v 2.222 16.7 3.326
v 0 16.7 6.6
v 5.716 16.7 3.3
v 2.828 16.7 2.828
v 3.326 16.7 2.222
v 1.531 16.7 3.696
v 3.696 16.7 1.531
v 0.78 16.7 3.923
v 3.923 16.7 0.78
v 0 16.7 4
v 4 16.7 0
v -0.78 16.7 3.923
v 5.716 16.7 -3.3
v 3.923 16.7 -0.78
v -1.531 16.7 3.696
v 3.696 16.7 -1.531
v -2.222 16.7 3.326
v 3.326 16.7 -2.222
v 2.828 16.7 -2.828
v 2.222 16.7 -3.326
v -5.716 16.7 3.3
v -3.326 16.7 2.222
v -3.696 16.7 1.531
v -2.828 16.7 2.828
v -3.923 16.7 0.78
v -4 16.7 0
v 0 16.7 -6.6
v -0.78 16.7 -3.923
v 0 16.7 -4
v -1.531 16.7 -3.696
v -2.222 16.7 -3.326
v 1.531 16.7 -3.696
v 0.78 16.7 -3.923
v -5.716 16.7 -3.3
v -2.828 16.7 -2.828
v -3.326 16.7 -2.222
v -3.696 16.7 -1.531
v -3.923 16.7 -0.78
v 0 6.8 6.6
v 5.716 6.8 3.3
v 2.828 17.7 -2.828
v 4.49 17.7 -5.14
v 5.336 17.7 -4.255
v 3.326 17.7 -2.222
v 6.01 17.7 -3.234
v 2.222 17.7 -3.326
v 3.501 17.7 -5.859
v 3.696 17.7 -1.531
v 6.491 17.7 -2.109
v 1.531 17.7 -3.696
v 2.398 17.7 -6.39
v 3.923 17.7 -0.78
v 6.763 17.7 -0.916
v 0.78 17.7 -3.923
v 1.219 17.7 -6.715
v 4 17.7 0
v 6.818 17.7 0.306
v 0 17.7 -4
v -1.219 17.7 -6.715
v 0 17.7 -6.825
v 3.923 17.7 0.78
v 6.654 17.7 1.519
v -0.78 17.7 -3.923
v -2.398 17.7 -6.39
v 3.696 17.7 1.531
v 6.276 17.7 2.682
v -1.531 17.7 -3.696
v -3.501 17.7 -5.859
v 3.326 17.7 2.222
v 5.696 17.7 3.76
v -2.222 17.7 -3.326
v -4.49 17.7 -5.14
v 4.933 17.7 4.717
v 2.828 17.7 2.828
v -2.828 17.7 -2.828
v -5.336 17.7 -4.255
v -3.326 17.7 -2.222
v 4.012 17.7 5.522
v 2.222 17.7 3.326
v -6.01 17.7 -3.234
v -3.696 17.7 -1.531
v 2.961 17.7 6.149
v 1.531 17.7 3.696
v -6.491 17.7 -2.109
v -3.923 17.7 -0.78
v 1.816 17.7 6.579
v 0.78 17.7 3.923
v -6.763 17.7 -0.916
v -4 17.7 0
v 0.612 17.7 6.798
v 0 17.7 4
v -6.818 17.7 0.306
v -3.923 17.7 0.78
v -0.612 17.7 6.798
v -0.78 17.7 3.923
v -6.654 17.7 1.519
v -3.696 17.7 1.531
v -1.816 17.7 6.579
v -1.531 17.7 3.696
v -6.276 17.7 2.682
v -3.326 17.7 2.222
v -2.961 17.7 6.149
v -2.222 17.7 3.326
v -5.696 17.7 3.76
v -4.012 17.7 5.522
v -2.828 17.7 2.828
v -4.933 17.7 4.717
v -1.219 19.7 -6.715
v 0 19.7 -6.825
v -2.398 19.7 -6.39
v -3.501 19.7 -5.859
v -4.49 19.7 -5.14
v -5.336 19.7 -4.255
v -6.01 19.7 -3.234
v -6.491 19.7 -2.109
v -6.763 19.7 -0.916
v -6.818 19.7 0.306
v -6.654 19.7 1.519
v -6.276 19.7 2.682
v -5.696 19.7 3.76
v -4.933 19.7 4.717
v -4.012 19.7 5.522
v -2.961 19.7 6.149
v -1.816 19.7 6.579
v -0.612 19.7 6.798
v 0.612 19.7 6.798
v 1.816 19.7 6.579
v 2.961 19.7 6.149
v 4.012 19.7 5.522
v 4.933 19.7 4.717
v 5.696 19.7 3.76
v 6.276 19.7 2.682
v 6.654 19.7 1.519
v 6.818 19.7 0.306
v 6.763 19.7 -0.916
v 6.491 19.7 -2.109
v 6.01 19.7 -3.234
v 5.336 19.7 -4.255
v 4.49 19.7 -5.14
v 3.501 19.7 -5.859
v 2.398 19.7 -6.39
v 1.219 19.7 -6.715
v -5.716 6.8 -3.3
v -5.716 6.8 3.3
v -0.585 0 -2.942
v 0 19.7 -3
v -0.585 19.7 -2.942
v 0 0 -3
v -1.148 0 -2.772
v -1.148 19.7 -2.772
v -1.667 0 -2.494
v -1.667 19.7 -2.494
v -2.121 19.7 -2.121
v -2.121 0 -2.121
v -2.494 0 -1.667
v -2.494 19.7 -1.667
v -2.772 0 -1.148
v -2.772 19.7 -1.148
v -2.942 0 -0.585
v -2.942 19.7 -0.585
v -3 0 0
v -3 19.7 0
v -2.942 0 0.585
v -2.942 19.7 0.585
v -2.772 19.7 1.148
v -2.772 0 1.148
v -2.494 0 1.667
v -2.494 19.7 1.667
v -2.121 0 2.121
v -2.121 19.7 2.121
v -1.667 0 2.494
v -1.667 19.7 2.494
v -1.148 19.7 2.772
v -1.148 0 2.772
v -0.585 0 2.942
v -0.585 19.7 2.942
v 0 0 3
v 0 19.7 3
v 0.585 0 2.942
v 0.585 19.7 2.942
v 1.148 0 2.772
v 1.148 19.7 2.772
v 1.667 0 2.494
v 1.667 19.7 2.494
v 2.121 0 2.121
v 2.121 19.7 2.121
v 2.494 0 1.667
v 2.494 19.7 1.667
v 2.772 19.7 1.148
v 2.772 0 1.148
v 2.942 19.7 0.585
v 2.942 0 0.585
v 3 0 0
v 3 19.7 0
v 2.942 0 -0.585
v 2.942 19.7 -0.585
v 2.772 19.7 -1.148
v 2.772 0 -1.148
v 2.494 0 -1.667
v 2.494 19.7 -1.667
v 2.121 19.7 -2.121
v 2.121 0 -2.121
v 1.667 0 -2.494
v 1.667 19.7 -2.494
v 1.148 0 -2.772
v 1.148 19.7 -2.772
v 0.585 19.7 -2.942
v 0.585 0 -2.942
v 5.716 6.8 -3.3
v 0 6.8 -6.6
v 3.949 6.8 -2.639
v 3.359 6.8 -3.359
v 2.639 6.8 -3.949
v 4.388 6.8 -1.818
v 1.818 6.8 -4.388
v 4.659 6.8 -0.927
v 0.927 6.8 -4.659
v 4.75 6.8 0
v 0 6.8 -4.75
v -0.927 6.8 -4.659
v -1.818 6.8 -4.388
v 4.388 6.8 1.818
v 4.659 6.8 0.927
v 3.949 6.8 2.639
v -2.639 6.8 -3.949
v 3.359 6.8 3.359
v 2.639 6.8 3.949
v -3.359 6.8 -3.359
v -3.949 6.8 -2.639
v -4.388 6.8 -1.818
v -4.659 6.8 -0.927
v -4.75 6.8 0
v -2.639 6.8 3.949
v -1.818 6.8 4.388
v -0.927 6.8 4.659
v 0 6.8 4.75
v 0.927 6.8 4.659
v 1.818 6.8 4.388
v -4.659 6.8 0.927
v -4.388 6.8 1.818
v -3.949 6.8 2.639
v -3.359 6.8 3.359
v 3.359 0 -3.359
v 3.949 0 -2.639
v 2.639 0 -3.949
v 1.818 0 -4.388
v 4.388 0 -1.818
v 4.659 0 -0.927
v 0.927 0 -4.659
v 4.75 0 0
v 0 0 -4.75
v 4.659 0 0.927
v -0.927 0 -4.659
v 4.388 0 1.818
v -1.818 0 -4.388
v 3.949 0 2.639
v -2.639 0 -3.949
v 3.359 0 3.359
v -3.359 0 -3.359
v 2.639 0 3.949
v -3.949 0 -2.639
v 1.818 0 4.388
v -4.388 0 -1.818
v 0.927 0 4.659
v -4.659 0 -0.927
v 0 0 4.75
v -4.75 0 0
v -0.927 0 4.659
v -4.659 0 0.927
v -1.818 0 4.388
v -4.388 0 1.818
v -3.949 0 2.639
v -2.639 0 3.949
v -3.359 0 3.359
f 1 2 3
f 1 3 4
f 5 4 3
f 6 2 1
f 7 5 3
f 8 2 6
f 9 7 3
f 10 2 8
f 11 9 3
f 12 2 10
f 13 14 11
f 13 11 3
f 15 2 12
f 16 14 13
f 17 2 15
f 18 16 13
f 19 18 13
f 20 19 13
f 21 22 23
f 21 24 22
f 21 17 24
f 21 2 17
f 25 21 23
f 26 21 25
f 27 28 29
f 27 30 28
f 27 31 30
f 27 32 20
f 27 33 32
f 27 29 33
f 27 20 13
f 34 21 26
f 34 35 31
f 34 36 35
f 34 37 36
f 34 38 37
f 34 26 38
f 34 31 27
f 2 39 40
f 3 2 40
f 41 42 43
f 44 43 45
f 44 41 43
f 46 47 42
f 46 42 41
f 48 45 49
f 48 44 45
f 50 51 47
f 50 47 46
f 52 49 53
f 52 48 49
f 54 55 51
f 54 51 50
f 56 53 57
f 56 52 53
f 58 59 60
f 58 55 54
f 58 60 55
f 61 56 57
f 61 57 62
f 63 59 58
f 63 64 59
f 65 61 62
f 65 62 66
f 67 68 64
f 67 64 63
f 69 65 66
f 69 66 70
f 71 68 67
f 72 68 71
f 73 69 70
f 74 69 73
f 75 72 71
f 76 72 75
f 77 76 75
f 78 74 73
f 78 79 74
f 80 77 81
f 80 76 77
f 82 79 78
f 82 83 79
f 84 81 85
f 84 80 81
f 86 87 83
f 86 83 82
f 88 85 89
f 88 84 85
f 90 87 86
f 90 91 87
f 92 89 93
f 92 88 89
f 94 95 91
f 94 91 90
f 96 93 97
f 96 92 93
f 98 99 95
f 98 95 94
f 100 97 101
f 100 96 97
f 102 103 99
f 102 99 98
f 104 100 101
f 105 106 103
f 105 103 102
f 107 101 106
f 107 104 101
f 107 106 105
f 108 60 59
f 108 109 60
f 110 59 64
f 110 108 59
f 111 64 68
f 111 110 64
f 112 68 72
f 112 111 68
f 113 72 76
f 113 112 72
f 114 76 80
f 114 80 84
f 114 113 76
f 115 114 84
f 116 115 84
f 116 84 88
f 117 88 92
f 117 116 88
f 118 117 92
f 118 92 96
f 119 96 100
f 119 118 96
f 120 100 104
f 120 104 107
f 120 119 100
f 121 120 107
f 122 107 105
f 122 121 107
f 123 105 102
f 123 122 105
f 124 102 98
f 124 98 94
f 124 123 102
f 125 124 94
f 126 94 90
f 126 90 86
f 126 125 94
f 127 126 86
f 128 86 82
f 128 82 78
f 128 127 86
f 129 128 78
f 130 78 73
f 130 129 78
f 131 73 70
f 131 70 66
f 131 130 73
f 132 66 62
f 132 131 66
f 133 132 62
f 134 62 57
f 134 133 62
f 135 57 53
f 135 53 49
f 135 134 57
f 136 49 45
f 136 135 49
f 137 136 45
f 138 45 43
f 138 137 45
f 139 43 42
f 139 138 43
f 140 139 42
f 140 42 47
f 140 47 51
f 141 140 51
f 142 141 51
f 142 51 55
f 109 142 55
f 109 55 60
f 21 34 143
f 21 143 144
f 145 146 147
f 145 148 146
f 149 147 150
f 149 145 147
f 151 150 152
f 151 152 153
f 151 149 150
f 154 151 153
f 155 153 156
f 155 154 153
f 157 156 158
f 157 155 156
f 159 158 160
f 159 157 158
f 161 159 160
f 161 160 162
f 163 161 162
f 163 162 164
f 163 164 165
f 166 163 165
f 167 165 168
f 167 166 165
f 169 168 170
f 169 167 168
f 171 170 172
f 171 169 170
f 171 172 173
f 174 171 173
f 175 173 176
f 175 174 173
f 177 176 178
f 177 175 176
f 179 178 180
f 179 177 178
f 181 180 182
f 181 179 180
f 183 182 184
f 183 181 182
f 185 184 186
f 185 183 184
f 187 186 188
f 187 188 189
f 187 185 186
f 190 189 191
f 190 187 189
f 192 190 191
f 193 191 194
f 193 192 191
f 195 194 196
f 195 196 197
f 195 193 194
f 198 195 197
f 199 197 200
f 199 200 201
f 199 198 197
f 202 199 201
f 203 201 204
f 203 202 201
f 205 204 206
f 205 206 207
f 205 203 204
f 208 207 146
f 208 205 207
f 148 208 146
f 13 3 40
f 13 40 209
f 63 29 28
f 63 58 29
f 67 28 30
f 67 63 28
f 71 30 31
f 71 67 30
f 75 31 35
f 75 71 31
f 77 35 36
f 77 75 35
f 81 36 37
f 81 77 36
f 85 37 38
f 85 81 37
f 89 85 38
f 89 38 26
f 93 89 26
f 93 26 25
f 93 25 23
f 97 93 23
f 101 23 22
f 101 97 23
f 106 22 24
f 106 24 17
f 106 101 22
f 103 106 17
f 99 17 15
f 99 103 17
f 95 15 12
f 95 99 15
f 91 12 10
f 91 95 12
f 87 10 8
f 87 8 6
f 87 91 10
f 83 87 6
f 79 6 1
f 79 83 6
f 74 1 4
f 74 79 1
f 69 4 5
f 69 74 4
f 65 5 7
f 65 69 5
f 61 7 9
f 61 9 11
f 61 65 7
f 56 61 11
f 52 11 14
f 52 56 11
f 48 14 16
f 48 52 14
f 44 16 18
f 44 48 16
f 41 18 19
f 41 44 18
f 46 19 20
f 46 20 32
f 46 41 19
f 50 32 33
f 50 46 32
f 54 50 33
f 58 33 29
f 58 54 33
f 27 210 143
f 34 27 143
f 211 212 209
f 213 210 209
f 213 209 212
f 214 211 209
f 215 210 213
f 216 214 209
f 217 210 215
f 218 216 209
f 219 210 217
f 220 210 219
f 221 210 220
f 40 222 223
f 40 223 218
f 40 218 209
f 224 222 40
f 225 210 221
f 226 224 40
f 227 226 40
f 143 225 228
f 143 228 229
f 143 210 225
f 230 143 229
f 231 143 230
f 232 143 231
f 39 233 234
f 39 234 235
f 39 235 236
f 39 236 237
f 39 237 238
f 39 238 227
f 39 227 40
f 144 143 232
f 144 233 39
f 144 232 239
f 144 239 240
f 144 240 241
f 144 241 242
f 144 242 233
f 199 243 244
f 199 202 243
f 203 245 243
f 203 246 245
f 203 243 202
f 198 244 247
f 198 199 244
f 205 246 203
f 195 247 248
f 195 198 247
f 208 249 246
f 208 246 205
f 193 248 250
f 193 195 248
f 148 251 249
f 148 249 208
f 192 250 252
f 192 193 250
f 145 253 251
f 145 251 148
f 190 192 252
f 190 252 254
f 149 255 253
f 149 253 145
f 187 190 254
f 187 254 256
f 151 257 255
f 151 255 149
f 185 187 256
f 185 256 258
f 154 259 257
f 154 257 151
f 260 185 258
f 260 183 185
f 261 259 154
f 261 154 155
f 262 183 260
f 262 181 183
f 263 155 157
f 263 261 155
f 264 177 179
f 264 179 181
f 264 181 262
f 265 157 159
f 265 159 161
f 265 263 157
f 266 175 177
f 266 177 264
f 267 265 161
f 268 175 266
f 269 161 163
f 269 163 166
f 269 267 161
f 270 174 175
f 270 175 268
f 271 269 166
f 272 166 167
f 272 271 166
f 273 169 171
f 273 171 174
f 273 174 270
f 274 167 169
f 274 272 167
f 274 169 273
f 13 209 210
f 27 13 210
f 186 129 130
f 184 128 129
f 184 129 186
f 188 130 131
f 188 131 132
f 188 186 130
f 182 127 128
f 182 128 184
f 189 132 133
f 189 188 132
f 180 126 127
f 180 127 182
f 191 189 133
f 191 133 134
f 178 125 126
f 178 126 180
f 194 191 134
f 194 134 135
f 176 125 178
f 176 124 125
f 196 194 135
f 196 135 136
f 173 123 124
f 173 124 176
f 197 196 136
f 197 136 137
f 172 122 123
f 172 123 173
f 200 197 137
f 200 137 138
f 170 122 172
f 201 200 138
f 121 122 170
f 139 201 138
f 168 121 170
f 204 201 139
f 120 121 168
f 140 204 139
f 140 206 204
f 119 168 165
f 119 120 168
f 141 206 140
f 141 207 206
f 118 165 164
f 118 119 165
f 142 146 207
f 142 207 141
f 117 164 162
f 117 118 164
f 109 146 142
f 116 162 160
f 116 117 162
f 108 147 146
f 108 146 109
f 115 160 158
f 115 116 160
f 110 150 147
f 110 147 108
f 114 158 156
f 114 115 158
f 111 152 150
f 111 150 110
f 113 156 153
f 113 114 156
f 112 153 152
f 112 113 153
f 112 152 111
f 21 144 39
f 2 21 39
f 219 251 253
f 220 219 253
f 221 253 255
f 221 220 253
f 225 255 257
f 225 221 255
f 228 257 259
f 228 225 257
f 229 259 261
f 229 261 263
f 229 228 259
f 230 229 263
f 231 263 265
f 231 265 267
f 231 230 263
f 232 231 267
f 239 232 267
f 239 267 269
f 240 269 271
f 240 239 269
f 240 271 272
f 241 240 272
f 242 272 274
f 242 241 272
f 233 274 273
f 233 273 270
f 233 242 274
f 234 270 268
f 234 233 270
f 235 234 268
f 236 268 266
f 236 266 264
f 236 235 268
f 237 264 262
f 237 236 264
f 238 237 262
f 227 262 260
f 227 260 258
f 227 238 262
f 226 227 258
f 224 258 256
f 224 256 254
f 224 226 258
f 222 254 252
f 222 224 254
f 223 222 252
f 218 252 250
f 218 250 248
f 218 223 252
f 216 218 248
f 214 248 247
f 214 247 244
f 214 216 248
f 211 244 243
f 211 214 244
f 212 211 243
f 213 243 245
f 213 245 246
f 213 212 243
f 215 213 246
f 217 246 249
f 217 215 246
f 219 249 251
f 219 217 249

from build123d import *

# Parameters (mm, degrees)
CUT_EXTRUDE1_REACH = 18.111


with BuildPart() as part:
    # Sketch1 → Revolve1 (revolve)
    with BuildSketch(Plane.XY, mode=Mode.PRIVATE) as revolve1_sk:
        Polygon((-4.75, 0), (-4.75, 6.8), (-6.6, 6.8), (-6.6, 16.7), (-4, 16.7), (-4, 17.7), (-6.825, 17.7), (-6.825, 19.7), (-3, 19.7), (-3, 0), align=None)
    revolve(revolve1_sk.sketch.rotate(Axis((0, 0, 0), (0, 1, 0)), 270), axis=Axis((0, 0, 0), (0, 1, 0)))

    # Sketch2 → Cut-Extrude1 (cut, up to next)
    with BuildSketch(Plane.XZ.offset(-6.8), mode=Mode.PRIVATE) as cut_extrude1_sk1:
        with BuildLine():
            Line((-5.715767665, 3.3), (0, 6.6))
            ThreePointArc((0, 6.6), (-3.3, 5.715767665), (-5.715767665, 3.3))
        make_face()
    cut_extrude1_tool1 = extrude(cut_extrude1_sk1.sketch, amount=-CUT_EXTRUDE1_REACH, mode=Mode.PRIVATE) & part.part
    # Sketch2 → Cut-Extrude1 (cut, up to next)
    with BuildSketch(Plane.XZ.offset(-6.8), mode=Mode.PRIVATE) as cut_extrude1_sk2:
        with BuildLine():
            ThreePointArc((5.715767665, 3.3), (3.3, 5.715767665), (0, 6.6))
            Line((0, 6.6), (5.715767665, 3.3))
        make_face()
    cut_extrude1_tool2 = extrude(cut_extrude1_sk2.sketch, amount=-CUT_EXTRUDE1_REACH, mode=Mode.PRIVATE) & part.part
    # Sketch2 → Cut-Extrude1 (cut, up to next)
    with BuildSketch(Plane.XZ.offset(-6.8), mode=Mode.PRIVATE) as cut_extrude1_sk3:
        with BuildLine():
            ThreePointArc((6.6, 0), (6.375110454, 1.708205698), (5.715767665, 3.3))
            Line((5.715767665, 3.3), (5.715767665, -3.3))
            ThreePointArc((5.715767665, -3.3), (6.375110454, -1.708205698), (6.6, 0))
        make_face()
    cut_extrude1_tool3 = extrude(cut_extrude1_sk3.sketch, amount=-CUT_EXTRUDE1_REACH, mode=Mode.PRIVATE) & part.part
    # Sketch2 → Cut-Extrude1 (cut, up to next)
    with BuildSketch(Plane.XZ.offset(-6.8), mode=Mode.PRIVATE) as cut_extrude1_sk4:
        with BuildLine():
            ThreePointArc((0, -6.6), (3.3, -5.715767665), (5.715767665, -3.3))
            Line((5.715767665, -3.3), (0, -6.6))
        make_face()
    cut_extrude1_tool4 = extrude(cut_extrude1_sk4.sketch, amount=-CUT_EXTRUDE1_REACH, mode=Mode.PRIVATE) & part.part
    # Sketch2 → Cut-Extrude1 (cut, up to next)
    with BuildSketch(Plane.XZ.offset(-6.8), mode=Mode.PRIVATE) as cut_extrude1_sk5:
        with BuildLine():
            Line((0, -6.6), (-5.715767665, -3.3))
            ThreePointArc((-5.715767665, -3.3), (-3.3, -5.715767665), (0, -6.6))
        make_face()
    cut_extrude1_tool5 = extrude(cut_extrude1_sk5.sketch, amount=-CUT_EXTRUDE1_REACH, mode=Mode.PRIVATE) & part.part
    # Sketch2 → Cut-Extrude1 (cut, up to next)
    with BuildSketch(Plane.XZ.offset(-6.8), mode=Mode.PRIVATE) as cut_extrude1_sk6:
        with BuildLine():
            Line((-5.715767665, -3.3), (-5.715767665, 3.3))
            ThreePointArc((-5.715767665, 3.3), (-6.6, 0), (-5.715767665, -3.3))
        make_face()
    cut_extrude1_tool6 = extrude(cut_extrude1_sk6.sketch, amount=-CUT_EXTRUDE1_REACH, mode=Mode.PRIVATE) & part.part
    add(cut_extrude1_tool1.solids().sort_by_distance((-3.035787, 6.8, 5.258137))[0], mode=Mode.SUBTRACT)
    add(cut_extrude1_tool2.solids().sort_by_distance((3.035787, 6.8, 5.258137))[0], mode=Mode.SUBTRACT)
    add(cut_extrude1_tool3.solids().sort_by_distance((6.071573, 6.8, 0))[0], mode=Mode.SUBTRACT)
    add(cut_extrude1_tool4.solids().sort_by_distance((3.035787, 6.8, -5.258137))[0], mode=Mode.SUBTRACT)
    add(cut_extrude1_tool5.solids().sort_by_distance((-3.035787, 6.8, -5.258137))[0], mode=Mode.SUBTRACT)
    add(cut_extrude1_tool6.solids().sort_by_distance((-6.071573, 6.8, 0))[0], mode=Mode.SUBTRACT)


solid = part.part
